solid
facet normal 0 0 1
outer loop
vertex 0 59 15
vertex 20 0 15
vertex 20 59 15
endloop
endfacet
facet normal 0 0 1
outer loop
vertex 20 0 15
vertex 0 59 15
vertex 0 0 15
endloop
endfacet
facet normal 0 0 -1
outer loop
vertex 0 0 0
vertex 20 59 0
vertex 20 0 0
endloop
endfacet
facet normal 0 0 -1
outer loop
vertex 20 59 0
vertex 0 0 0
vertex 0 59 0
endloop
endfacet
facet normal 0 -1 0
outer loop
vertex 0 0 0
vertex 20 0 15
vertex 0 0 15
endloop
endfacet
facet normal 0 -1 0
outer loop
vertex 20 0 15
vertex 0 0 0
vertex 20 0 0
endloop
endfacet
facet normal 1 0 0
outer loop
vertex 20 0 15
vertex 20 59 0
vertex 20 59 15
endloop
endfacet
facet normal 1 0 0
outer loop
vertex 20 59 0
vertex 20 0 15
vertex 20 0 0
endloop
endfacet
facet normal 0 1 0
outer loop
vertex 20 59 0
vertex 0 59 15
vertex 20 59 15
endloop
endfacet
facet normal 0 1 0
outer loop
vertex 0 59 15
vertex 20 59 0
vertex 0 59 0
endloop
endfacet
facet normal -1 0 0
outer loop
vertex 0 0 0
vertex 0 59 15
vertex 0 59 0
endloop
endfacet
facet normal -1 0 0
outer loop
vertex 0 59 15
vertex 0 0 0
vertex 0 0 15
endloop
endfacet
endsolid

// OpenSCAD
$fa=4; // default minimum facet angle is now 0.5
$fs=0.05; // default minimum facet size is now 0.05 mm

height = 15;
width = 20;
length = 59;

wallThickness = 3.2;

difference() {
  cube([width, length, height]);
  // translate([wallThickness, wallThickness, -.1]) cube([width - wallThickness * 2, length - wallThickness * 2, height + .2]);
}
